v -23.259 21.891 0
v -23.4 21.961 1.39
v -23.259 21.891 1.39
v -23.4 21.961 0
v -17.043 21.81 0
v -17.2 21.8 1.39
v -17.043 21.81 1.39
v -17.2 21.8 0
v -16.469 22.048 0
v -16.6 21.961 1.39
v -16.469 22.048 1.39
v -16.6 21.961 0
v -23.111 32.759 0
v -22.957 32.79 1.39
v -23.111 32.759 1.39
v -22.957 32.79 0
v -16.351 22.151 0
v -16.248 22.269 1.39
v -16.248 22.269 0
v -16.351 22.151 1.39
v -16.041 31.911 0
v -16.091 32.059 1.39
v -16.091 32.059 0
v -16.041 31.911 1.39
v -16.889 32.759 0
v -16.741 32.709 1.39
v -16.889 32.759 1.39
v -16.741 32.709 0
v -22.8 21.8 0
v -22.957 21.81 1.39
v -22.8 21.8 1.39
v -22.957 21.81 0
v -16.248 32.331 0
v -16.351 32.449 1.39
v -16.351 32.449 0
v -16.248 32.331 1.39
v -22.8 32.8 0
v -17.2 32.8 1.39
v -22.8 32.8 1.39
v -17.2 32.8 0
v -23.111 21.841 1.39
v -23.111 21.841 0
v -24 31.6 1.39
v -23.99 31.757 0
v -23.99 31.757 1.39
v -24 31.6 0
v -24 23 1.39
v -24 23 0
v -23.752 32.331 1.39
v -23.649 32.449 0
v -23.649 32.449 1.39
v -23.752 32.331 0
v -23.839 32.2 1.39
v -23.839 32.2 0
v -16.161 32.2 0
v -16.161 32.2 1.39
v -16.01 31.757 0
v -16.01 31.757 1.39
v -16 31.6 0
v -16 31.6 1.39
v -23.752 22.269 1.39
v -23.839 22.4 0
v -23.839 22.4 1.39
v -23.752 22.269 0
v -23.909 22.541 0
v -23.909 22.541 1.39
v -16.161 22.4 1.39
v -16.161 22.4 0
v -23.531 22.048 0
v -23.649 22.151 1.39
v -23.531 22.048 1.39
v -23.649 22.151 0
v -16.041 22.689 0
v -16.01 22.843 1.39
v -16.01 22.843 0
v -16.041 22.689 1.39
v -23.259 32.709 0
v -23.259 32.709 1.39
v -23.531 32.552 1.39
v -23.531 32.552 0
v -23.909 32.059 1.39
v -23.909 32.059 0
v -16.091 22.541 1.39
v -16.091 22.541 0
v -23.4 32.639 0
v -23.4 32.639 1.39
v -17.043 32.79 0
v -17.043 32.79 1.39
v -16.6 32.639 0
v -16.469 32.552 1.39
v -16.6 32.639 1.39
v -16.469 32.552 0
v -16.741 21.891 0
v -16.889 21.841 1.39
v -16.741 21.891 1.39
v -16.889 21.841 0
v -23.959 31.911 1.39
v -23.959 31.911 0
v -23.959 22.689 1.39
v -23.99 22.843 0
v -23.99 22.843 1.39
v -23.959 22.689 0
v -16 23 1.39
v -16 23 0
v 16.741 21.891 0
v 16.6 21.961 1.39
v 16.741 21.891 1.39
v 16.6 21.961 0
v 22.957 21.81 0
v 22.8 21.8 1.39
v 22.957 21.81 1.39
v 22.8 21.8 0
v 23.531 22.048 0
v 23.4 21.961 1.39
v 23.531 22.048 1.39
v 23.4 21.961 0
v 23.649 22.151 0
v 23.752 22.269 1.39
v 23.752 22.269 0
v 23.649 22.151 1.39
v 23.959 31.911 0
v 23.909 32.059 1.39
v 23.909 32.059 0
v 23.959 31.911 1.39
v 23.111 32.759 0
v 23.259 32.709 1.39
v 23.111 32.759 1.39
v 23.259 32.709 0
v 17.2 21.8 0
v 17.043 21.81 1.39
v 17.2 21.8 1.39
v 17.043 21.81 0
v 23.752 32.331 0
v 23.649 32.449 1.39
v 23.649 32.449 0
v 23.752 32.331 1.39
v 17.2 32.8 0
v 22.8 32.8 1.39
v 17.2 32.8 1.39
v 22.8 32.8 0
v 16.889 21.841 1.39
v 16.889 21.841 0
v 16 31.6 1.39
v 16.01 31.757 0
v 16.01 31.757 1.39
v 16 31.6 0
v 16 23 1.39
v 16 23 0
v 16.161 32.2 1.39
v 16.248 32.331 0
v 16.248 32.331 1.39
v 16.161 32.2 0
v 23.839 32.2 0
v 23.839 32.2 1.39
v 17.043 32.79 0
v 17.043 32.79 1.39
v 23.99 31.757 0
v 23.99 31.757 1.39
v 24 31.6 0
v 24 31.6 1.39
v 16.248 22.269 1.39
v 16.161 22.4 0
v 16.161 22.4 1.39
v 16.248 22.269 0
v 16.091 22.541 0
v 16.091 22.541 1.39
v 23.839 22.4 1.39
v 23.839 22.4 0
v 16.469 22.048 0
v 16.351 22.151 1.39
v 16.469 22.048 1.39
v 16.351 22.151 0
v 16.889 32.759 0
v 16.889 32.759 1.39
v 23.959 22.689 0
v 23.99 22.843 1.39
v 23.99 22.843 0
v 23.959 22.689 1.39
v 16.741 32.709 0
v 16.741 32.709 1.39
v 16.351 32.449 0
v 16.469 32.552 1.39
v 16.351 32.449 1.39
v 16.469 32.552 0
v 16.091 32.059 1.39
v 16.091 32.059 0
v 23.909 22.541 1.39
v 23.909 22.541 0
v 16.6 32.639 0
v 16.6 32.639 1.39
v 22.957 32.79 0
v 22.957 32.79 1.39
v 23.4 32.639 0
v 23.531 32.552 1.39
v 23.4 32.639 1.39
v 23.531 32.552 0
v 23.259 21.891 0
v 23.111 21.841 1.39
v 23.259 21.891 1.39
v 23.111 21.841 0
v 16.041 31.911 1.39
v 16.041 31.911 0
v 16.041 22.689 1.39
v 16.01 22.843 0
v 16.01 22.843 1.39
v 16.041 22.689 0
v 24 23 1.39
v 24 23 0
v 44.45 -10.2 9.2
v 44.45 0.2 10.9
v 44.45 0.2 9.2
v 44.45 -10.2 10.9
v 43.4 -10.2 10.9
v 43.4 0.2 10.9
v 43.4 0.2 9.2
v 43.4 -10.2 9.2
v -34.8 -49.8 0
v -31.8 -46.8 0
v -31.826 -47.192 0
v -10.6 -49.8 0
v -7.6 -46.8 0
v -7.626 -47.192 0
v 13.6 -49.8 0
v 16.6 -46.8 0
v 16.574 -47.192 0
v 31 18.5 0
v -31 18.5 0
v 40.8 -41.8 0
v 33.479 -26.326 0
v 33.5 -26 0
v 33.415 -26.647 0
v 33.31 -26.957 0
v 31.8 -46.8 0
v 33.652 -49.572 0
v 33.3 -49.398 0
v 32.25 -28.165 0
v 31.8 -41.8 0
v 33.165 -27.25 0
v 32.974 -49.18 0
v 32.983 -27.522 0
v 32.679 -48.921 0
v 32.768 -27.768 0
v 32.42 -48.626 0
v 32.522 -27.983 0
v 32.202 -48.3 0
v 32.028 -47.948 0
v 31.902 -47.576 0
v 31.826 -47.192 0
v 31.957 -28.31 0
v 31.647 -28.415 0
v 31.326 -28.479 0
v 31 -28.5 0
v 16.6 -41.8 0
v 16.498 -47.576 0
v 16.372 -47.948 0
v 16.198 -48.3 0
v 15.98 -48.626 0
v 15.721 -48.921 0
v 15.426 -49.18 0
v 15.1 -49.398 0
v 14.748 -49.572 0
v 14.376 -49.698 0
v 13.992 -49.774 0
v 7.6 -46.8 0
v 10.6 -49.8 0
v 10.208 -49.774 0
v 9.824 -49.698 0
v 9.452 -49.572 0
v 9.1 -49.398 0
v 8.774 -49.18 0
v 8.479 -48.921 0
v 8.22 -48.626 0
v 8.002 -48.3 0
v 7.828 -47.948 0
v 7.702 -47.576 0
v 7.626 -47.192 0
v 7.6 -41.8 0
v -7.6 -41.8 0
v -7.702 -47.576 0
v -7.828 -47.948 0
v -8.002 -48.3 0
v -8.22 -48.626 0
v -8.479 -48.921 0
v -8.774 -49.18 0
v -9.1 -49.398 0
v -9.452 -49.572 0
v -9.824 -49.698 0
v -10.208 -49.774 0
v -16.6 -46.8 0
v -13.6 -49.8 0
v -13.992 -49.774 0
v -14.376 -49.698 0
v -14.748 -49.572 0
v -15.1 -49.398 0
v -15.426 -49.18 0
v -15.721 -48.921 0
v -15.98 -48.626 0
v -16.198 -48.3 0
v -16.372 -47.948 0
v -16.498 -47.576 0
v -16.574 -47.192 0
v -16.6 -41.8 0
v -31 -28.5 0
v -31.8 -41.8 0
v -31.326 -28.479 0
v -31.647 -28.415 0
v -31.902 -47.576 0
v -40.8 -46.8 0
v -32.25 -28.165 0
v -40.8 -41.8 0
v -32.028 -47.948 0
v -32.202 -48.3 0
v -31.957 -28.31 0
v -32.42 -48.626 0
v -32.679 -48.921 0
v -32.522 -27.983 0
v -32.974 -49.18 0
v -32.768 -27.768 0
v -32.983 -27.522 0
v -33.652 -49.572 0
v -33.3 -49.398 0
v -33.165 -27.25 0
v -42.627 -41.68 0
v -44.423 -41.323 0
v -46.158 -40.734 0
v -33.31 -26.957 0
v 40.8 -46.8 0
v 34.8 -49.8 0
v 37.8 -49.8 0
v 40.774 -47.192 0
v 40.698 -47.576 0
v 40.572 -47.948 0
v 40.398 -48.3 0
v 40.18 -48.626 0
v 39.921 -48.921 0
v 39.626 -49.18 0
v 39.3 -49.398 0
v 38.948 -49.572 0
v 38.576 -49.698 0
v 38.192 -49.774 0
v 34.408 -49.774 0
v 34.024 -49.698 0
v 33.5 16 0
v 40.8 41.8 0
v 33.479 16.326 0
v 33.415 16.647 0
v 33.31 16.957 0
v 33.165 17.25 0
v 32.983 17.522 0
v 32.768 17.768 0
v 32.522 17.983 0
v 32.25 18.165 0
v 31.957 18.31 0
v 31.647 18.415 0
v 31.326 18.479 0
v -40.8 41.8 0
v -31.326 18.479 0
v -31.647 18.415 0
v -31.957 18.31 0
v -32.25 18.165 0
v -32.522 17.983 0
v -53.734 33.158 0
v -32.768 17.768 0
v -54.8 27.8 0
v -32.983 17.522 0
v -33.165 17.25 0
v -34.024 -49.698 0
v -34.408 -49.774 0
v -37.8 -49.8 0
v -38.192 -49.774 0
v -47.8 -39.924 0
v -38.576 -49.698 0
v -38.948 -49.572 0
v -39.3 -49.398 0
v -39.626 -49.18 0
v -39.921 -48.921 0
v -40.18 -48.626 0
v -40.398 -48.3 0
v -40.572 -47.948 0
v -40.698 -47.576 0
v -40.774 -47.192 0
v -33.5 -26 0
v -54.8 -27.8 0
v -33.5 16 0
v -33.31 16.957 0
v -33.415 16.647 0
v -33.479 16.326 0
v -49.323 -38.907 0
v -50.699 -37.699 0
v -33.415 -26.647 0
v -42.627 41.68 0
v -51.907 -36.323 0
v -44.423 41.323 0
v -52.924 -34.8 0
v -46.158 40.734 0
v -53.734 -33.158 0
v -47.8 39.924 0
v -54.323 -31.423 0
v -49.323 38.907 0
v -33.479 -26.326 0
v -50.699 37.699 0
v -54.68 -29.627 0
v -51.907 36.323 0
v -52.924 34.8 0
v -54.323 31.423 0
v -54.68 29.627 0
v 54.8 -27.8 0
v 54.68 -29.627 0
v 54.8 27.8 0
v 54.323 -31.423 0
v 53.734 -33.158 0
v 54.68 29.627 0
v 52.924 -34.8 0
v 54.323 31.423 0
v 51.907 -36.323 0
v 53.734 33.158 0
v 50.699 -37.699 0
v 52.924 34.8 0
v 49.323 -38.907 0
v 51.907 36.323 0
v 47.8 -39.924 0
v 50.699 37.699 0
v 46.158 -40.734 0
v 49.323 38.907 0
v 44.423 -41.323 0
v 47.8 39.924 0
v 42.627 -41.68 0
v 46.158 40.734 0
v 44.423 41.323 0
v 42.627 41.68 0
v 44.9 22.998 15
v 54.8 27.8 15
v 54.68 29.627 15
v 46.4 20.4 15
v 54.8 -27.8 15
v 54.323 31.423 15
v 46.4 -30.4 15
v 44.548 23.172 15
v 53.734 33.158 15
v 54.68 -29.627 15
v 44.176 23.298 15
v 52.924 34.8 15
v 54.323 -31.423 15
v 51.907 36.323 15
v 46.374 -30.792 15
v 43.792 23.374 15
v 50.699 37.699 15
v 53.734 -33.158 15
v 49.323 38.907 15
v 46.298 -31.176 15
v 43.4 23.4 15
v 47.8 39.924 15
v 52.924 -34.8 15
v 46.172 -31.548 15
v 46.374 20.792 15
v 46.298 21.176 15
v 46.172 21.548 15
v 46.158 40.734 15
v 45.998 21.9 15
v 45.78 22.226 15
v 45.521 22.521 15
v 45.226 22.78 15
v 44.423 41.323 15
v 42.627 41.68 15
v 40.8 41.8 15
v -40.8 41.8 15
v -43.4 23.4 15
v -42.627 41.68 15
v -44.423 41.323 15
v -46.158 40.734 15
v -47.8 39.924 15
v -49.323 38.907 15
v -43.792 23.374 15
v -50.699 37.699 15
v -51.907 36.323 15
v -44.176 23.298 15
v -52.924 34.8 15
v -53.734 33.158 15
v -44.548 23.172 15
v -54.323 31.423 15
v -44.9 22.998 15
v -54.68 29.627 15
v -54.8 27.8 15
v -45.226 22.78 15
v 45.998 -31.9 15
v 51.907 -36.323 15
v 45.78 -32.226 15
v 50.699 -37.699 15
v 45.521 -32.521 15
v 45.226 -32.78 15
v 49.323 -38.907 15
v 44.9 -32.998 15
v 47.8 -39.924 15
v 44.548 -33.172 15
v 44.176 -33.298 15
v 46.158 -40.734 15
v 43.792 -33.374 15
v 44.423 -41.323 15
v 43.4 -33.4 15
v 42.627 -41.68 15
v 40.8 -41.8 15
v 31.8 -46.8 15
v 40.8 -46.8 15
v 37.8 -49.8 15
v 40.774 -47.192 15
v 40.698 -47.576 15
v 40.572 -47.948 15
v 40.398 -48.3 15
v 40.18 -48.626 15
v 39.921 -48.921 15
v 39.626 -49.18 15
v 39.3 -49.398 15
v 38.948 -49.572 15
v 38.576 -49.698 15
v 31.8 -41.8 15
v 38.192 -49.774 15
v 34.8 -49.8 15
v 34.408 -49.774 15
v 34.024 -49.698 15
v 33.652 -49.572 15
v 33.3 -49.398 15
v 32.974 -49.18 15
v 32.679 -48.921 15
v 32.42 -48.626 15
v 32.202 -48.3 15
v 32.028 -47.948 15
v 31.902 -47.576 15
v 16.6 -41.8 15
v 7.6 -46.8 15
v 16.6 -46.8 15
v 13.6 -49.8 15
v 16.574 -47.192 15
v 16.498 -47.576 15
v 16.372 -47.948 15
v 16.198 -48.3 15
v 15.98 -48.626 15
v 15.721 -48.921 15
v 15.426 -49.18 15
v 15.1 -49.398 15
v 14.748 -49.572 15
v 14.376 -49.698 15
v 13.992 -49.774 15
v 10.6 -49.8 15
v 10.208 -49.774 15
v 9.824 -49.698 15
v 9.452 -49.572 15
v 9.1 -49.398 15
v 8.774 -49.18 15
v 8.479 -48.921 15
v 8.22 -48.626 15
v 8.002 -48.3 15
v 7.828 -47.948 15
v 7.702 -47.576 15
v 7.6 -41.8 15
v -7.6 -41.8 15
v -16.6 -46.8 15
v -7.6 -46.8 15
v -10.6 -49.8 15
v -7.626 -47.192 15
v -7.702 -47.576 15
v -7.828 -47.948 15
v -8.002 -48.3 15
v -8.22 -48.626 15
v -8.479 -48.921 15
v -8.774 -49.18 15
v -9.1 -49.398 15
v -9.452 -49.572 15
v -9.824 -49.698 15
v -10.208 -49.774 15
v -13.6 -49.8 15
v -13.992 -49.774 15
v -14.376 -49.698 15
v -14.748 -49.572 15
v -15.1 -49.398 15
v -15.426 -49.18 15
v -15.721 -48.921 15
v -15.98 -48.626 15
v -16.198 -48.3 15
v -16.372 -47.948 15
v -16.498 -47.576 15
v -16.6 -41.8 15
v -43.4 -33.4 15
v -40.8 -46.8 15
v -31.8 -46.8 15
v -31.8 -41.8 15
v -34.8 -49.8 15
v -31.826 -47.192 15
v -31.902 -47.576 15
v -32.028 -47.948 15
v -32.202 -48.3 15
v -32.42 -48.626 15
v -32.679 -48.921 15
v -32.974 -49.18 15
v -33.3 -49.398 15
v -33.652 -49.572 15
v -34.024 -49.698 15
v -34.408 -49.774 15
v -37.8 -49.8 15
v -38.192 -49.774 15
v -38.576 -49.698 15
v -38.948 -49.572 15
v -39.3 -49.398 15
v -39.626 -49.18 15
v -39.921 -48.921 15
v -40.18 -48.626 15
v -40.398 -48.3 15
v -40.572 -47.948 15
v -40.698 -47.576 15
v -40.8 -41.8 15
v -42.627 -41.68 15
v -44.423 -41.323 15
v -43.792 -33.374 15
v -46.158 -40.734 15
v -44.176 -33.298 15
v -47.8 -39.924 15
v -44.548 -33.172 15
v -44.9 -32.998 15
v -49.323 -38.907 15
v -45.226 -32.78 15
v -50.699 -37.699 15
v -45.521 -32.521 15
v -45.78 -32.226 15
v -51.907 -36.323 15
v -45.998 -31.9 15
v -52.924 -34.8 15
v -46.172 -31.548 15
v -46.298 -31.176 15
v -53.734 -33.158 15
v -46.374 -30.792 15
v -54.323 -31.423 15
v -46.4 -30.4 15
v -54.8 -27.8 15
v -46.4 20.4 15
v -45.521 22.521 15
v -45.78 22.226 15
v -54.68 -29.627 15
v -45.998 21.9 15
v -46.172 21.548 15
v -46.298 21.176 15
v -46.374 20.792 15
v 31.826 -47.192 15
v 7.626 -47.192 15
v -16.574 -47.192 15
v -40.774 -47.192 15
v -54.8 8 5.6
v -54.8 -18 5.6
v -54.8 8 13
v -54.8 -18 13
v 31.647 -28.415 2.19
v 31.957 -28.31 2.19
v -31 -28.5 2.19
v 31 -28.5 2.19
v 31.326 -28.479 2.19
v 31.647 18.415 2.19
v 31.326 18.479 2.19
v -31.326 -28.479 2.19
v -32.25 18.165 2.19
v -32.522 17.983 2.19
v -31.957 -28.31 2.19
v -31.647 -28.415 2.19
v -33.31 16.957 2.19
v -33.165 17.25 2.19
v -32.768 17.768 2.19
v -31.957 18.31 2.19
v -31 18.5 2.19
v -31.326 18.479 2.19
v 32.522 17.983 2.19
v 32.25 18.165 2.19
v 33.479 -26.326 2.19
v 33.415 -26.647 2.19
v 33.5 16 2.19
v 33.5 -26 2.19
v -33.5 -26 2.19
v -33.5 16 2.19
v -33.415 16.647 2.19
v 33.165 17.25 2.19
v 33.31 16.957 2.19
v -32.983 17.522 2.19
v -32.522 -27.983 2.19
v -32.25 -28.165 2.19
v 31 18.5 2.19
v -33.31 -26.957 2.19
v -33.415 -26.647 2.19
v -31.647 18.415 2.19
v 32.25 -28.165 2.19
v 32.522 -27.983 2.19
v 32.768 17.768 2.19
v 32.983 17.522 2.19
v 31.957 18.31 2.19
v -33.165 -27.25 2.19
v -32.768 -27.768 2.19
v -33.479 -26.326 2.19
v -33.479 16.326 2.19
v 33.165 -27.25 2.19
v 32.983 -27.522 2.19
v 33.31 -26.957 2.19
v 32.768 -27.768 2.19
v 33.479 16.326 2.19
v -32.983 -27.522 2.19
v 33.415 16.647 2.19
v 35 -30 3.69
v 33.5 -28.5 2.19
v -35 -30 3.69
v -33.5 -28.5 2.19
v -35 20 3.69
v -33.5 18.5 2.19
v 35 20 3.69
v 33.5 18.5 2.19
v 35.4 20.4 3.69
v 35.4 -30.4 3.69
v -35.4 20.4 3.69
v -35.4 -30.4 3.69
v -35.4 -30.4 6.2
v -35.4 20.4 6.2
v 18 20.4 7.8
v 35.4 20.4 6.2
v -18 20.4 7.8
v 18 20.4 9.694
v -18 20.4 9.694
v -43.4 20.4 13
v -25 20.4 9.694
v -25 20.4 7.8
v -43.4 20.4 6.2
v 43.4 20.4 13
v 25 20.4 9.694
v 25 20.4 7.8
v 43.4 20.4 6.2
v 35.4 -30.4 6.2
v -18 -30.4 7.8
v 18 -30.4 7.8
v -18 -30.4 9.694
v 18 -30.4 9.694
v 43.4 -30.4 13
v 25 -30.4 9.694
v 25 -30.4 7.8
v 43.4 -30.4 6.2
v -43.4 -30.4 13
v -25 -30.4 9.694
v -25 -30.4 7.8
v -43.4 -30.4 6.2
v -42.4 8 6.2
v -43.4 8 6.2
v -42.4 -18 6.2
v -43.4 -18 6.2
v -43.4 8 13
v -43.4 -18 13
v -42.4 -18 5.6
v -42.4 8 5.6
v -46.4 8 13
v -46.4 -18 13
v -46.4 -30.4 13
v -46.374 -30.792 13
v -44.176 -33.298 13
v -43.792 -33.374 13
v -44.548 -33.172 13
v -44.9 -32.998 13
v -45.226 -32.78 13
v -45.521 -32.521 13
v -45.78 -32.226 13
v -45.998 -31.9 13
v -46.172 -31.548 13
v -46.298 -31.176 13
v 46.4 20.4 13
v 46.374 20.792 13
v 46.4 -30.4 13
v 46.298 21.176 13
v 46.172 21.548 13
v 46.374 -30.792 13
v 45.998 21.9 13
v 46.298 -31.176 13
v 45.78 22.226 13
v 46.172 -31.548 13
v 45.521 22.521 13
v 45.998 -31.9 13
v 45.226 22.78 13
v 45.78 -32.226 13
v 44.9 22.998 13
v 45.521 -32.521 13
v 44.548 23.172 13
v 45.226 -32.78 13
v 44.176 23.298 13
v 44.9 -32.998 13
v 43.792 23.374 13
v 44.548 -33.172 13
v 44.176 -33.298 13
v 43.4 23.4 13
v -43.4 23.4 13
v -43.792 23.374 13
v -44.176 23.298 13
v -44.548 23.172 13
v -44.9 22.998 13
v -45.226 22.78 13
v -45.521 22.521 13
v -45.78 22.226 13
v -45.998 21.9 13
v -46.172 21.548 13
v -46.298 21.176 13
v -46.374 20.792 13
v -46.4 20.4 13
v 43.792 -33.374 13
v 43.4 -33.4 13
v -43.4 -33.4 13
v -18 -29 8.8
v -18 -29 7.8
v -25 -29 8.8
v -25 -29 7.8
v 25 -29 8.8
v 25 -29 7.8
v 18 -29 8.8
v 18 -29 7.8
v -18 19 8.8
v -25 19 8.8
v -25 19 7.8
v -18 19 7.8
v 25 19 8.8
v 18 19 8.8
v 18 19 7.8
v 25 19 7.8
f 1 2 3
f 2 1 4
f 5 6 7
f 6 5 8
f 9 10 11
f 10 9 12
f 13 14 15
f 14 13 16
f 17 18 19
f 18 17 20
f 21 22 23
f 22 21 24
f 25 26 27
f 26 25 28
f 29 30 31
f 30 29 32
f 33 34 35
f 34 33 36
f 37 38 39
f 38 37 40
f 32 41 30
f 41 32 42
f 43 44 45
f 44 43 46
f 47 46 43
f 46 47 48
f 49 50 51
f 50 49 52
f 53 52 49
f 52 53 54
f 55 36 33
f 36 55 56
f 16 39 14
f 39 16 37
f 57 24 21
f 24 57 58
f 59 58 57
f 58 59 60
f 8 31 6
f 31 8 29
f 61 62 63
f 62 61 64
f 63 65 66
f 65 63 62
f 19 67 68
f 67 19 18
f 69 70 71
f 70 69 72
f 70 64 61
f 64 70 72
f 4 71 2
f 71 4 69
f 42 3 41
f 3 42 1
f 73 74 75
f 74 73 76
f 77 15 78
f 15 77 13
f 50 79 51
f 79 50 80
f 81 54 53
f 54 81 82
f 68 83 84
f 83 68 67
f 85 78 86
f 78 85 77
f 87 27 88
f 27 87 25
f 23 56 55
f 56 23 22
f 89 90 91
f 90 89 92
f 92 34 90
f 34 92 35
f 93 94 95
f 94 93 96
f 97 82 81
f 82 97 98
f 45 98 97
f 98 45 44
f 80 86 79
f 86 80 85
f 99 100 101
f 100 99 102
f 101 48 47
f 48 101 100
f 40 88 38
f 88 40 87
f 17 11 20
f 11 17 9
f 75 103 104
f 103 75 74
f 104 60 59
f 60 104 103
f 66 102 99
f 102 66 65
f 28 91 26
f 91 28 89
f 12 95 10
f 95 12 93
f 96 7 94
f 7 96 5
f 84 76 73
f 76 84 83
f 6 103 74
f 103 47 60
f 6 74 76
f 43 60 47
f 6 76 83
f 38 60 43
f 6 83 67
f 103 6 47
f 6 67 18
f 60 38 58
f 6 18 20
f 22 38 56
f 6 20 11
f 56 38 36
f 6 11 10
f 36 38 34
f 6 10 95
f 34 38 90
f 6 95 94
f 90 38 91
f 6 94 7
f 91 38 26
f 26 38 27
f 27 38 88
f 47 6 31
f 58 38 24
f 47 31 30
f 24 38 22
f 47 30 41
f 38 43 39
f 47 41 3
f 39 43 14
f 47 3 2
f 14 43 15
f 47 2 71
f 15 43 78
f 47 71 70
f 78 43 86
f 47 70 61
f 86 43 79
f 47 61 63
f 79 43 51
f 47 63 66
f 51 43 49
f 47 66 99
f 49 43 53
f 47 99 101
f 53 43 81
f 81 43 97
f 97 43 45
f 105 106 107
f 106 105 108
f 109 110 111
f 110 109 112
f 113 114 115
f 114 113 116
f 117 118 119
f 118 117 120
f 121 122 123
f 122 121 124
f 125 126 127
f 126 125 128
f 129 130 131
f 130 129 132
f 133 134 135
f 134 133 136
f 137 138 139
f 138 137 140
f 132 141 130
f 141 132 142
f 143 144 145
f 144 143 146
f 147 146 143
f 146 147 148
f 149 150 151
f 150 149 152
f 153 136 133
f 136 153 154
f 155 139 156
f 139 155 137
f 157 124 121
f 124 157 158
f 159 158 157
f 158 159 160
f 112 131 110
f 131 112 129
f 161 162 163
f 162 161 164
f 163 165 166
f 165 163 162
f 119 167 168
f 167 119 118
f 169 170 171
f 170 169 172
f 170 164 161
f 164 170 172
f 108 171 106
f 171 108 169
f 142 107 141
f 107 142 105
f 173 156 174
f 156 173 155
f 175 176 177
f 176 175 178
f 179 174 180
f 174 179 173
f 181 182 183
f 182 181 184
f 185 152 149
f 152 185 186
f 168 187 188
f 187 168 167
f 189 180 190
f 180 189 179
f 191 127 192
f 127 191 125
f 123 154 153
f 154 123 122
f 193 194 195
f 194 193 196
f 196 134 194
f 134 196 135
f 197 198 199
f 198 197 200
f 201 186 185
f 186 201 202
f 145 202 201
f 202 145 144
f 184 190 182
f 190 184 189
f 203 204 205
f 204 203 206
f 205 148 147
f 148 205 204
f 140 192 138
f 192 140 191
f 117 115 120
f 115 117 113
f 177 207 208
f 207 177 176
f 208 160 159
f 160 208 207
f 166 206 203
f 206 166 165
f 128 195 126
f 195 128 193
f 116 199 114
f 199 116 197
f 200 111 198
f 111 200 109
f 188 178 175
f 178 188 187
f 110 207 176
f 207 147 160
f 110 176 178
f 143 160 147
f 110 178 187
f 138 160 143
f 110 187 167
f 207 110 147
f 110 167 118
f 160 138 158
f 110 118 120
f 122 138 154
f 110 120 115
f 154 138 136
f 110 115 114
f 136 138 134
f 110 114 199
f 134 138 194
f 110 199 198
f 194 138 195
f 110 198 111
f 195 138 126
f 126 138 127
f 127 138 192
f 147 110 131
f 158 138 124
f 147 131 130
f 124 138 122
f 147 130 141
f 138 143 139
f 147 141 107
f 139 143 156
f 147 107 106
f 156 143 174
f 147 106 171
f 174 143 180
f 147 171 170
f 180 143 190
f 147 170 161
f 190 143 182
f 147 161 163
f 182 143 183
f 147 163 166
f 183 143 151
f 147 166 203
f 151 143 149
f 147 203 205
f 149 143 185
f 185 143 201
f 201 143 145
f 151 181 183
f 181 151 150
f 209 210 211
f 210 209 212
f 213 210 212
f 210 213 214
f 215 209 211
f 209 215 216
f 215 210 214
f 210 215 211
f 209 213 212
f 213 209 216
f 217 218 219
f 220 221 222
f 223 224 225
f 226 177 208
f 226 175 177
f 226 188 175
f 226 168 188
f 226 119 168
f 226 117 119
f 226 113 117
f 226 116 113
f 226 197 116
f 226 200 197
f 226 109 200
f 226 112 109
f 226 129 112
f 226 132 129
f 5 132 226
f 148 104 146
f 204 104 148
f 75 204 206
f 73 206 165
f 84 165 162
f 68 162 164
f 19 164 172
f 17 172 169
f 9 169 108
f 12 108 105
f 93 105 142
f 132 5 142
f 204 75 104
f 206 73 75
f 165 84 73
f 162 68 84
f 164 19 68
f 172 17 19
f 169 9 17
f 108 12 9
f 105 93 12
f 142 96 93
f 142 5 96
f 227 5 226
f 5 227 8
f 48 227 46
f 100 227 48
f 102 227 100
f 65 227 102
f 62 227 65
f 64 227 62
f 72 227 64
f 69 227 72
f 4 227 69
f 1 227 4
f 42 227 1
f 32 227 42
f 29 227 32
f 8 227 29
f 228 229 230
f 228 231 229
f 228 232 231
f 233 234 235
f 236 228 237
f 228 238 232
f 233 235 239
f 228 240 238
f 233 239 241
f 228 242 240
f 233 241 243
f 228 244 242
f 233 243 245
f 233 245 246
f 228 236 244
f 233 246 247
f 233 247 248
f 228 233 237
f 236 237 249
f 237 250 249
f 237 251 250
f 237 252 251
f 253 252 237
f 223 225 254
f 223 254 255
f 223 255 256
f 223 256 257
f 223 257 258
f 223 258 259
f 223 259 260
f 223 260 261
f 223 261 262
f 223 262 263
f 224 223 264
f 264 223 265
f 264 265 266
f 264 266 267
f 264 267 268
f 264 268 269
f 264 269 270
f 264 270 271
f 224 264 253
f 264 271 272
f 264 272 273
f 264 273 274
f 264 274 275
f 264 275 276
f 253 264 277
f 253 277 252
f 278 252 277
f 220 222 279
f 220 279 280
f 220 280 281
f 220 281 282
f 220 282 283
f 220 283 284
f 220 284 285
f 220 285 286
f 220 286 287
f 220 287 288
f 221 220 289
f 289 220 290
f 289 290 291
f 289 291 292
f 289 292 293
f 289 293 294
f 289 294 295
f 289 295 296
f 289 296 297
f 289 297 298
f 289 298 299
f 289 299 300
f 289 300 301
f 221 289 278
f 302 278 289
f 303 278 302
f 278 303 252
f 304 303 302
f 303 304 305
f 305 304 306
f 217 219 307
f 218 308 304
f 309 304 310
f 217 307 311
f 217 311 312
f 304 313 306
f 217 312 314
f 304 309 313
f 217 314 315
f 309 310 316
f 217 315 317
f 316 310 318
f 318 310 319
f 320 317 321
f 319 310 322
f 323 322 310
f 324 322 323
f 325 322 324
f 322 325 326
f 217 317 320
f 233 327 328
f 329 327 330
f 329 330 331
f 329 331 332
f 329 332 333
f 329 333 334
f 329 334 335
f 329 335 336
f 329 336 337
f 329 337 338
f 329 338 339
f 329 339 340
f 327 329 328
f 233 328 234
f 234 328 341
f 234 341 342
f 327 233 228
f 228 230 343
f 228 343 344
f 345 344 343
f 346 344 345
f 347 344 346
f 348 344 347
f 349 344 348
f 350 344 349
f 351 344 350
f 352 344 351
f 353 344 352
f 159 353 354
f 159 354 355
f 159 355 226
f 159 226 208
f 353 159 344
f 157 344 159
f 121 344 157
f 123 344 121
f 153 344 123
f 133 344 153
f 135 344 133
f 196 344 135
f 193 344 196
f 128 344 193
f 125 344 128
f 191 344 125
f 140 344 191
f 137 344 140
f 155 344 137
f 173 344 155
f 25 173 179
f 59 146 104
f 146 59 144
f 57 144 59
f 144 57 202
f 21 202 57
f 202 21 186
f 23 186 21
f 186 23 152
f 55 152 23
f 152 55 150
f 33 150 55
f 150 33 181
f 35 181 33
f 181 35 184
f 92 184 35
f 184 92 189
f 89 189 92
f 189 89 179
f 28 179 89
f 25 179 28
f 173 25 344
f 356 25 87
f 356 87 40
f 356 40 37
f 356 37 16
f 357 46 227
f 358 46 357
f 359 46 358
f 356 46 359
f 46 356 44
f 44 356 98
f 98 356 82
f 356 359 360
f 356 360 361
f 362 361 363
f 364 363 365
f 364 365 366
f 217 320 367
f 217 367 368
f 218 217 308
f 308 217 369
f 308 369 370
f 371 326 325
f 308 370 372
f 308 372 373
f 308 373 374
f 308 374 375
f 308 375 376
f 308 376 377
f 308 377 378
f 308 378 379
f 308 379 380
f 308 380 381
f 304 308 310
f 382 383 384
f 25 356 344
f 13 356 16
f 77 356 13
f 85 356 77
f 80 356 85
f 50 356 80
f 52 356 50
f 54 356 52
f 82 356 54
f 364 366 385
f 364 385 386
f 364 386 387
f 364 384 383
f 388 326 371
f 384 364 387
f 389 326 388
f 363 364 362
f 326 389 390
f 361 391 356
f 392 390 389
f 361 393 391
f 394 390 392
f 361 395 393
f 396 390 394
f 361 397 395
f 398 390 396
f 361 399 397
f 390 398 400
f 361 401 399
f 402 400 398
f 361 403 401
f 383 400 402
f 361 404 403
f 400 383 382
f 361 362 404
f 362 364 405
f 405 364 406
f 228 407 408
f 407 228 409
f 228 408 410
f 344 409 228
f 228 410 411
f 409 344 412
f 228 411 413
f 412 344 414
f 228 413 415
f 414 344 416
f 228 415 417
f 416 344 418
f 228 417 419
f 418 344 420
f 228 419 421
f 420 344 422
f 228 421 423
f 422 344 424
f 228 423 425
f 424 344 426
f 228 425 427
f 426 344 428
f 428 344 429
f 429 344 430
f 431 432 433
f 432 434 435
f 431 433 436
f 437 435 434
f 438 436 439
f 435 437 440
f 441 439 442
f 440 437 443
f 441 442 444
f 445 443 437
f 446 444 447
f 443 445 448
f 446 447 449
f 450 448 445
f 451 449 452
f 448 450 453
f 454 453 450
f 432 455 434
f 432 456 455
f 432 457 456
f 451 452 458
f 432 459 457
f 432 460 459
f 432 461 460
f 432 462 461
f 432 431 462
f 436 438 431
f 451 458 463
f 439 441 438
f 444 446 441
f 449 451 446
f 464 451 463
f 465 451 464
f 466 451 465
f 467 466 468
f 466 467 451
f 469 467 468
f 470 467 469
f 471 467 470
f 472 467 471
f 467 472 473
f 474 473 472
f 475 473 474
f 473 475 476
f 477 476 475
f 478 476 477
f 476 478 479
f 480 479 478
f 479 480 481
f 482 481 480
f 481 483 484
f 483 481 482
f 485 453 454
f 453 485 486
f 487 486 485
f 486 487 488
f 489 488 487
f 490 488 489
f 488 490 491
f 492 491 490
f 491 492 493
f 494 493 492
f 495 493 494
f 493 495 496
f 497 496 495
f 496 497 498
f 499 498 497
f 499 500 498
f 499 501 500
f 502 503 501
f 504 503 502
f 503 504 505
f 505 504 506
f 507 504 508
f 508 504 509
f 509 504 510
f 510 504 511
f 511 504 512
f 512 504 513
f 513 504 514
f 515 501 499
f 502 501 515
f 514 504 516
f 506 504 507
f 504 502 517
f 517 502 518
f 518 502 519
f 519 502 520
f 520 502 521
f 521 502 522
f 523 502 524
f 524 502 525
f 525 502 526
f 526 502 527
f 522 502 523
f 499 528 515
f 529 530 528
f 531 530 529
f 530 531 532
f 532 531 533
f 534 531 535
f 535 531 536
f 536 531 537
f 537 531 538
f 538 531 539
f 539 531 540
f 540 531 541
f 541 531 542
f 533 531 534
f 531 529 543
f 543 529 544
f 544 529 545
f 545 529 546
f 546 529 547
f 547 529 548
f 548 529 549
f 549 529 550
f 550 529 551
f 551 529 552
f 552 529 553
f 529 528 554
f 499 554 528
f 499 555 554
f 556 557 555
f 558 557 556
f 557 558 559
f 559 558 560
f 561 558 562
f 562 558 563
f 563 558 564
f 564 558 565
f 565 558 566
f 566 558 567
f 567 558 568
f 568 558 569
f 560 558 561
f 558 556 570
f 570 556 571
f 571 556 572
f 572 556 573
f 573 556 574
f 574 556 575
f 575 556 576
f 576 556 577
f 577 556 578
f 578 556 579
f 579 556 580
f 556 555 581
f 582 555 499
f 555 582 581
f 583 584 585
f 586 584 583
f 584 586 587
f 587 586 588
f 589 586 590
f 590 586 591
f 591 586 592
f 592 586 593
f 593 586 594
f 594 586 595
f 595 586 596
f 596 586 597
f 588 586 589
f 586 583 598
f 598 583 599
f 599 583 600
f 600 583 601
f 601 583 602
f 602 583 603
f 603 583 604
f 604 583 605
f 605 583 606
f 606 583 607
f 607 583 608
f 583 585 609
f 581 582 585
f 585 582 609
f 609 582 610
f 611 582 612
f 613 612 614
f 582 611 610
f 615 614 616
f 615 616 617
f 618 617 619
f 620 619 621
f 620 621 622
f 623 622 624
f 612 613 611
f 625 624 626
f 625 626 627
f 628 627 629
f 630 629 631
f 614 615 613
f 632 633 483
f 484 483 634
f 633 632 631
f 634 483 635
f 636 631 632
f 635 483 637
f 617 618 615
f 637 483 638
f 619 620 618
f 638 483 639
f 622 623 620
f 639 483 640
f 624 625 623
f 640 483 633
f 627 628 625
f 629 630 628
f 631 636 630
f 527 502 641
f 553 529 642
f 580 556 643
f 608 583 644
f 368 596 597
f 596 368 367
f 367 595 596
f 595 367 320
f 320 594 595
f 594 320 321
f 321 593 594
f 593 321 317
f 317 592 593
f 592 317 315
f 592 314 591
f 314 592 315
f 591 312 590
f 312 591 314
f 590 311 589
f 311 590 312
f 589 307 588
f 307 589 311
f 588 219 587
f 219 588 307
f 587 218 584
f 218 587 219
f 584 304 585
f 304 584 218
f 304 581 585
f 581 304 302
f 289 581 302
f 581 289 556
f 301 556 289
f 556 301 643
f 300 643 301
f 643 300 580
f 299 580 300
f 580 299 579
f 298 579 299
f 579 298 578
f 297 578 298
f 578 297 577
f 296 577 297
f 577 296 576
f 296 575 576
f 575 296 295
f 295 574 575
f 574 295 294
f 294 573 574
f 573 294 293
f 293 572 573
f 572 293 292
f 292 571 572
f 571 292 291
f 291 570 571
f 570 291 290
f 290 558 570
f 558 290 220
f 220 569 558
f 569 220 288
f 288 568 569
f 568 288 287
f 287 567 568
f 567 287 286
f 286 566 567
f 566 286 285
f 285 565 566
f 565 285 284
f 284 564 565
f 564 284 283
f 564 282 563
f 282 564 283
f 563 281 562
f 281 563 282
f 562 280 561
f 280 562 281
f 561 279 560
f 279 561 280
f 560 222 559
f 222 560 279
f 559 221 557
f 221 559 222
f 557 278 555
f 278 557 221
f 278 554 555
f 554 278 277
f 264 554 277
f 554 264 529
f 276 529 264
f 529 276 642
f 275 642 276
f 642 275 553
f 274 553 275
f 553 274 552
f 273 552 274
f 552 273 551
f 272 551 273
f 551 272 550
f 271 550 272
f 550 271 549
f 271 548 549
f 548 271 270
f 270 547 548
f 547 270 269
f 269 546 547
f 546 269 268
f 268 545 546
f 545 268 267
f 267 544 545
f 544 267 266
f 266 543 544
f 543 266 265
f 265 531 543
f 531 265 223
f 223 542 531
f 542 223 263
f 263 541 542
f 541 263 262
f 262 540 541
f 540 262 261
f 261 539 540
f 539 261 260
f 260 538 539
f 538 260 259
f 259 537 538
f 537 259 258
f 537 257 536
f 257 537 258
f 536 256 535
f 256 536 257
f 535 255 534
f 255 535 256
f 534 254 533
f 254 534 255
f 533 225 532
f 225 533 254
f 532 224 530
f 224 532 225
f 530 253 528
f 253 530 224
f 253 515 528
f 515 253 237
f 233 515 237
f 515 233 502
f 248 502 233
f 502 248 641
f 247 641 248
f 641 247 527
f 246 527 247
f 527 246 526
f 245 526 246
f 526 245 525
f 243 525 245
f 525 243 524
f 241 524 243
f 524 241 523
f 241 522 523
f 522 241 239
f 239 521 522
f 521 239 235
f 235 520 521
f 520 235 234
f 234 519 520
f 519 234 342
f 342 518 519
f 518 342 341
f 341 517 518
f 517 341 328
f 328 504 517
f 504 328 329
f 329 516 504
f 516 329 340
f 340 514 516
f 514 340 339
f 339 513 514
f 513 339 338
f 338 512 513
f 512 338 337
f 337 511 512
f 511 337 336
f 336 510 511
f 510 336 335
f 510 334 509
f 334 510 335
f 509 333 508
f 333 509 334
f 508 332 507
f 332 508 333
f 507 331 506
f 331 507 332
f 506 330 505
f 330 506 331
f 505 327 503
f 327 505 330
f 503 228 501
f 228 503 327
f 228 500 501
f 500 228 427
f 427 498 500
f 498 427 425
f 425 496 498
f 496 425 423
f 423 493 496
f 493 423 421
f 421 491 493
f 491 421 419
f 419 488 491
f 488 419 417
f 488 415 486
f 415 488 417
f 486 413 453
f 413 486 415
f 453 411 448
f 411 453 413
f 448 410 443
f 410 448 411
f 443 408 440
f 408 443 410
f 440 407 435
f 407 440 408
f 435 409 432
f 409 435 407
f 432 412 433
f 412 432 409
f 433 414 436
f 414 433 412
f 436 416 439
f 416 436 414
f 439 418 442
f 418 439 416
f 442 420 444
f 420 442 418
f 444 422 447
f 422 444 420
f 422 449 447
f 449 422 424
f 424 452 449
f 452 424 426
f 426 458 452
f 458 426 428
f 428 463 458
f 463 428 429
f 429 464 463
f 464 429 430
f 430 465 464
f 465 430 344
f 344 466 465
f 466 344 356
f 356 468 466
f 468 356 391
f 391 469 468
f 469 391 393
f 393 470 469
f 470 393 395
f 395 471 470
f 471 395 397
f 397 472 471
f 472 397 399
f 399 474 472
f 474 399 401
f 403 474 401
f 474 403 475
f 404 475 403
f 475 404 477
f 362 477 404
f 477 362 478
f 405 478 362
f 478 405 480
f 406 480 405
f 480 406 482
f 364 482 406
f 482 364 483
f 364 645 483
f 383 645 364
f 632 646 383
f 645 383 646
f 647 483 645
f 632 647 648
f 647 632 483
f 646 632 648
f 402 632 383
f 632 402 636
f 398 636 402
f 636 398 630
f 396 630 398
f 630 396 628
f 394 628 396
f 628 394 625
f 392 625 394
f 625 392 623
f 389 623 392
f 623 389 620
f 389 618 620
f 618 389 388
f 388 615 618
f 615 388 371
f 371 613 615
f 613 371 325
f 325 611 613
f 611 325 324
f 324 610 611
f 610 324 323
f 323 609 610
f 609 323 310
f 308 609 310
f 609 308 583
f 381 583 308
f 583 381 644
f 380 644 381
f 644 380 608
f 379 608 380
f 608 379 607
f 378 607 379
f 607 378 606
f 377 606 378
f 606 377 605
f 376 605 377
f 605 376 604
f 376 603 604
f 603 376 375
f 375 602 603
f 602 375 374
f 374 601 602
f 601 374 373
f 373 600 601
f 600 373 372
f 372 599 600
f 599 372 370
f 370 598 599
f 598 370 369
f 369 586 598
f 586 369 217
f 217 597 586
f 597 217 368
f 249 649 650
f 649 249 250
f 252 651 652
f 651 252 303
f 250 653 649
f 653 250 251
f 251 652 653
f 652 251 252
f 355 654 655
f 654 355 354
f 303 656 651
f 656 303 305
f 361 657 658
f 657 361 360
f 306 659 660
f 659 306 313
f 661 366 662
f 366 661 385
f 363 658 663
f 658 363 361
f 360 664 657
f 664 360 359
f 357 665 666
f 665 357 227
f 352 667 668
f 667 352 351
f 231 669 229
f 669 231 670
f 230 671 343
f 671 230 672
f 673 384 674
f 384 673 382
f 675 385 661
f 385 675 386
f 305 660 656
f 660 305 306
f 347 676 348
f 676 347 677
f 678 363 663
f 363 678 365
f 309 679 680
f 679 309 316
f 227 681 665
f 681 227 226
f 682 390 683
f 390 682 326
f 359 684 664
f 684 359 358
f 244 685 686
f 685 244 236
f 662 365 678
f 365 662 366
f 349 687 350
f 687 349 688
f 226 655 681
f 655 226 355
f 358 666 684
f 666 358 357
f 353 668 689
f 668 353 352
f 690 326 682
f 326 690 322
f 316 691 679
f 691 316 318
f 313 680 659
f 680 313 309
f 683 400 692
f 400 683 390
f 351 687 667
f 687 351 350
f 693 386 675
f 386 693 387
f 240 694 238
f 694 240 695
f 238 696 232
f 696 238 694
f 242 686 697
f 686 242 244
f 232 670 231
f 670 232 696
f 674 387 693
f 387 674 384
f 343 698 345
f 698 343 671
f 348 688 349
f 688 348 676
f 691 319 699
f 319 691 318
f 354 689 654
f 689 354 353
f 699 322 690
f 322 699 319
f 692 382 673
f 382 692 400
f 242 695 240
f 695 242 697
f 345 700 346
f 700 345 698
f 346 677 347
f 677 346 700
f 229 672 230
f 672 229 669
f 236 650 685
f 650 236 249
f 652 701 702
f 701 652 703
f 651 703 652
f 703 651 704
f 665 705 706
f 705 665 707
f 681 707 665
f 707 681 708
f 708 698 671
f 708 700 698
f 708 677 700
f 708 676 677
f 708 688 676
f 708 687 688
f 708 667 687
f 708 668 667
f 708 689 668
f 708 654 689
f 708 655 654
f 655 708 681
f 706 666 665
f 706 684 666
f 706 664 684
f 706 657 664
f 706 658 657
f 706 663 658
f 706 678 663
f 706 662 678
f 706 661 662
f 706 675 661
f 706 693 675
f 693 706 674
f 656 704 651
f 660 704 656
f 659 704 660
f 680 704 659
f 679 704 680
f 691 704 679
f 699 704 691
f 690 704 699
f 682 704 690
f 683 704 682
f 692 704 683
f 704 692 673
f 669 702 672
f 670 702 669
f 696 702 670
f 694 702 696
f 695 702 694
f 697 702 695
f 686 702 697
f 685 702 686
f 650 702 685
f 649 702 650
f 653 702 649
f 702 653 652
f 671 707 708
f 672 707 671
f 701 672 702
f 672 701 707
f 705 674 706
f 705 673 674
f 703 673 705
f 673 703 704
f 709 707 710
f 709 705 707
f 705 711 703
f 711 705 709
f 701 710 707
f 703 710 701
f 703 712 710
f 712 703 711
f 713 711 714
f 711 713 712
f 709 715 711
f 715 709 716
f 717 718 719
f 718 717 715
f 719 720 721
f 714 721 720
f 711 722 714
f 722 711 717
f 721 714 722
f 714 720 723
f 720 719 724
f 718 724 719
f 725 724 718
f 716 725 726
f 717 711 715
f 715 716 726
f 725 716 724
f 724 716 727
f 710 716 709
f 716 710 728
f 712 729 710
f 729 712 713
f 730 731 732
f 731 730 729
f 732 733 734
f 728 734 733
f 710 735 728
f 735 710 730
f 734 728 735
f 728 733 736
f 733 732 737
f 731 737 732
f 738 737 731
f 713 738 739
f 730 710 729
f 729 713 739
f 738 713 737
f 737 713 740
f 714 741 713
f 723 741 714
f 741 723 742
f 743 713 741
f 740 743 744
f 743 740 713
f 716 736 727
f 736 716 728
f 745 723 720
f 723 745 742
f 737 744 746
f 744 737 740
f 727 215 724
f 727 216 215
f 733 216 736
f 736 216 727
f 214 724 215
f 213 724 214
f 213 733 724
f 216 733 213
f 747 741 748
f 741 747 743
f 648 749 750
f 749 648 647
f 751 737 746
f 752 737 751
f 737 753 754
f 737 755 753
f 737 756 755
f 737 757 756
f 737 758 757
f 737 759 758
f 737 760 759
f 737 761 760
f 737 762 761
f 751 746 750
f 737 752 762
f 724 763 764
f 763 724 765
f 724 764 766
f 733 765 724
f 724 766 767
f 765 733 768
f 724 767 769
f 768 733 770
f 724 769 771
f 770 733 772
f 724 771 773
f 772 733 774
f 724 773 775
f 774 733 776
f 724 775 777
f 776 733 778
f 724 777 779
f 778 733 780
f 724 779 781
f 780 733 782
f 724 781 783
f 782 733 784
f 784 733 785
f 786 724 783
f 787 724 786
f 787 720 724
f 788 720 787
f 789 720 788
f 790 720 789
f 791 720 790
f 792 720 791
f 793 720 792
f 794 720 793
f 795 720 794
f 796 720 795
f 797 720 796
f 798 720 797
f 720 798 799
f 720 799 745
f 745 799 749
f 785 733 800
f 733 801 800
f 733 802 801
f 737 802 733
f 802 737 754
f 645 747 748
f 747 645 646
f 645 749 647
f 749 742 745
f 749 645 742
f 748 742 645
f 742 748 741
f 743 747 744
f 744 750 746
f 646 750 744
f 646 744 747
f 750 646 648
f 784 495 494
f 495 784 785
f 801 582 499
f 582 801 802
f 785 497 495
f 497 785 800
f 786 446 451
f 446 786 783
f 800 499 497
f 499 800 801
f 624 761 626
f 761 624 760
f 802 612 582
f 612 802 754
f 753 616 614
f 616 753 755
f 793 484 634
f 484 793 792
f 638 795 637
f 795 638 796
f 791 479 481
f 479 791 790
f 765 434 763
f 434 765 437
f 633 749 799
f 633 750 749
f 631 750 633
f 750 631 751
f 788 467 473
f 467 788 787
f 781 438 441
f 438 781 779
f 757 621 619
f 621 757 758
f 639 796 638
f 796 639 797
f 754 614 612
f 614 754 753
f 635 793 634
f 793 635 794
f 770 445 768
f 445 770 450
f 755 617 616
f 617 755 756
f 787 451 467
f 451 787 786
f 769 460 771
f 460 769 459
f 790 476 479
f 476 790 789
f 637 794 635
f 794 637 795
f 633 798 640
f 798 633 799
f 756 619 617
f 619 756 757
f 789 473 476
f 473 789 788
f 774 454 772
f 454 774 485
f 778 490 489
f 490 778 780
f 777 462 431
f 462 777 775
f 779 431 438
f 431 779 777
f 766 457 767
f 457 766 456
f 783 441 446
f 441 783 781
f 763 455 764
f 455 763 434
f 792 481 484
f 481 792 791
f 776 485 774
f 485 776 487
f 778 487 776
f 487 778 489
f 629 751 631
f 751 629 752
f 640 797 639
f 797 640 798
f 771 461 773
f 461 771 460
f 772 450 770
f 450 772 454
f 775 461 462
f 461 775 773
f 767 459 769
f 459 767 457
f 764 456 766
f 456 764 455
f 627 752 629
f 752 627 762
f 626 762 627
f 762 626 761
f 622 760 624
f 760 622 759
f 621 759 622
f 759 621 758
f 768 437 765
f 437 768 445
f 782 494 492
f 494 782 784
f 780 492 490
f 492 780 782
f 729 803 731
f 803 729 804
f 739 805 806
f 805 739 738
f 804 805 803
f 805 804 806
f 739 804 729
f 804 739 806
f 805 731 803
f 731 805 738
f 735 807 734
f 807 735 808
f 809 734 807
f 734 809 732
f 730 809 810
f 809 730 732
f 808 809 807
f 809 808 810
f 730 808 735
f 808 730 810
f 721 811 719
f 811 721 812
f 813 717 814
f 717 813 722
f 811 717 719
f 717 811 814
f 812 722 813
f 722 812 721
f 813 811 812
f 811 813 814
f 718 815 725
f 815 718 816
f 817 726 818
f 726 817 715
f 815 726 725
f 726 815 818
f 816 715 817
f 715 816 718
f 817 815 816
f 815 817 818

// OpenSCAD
// =====================================================================
// Clawd CYD — carcaça para a CYD ESP32-2432S028 no formato do Clawd
// =====================================================================
//
// Duas peças, encaixe por pressão, SEM parafuso:
//
//   corpo  — o bichinho. A cara já vem com a janela da tela. A placa entra
//            por TRÁS, tela virada para a janela.
//   tampa  — fecha as costas, prende a placa e leva o canal do cabo.
//
// Por que a cara é inteiriça e a abertura fica atrás: assim não há emenda
// nenhuma na frente, que é o lado que se olha.
//
// ---------------------------------------------------------------------
// DE ONDE VÊM AS MEDIDAS — leia antes de imprimir a peça inteira
// ---------------------------------------------------------------------
// As medidas da placa são as PUBLICADAS para a ESP32-2432S028, não medidas
// nesta unidade com paquímetro:
//
//   PCB                86 x 50 x 1,6 mm
//   módulo da tela     70 x 50 mm, sobressaindo 4 mm da face do PCB
//   área visível       59,5 x 45 mm
//   componentes atrás  até 4,8 mm (botões e conector do alto-falante)
//
// Duas coisas eu NÃO encontrei publicadas e portanto NÃO uso:
//   - a posição dos furos de fixação  -> a placa é presa por abas elásticas
//     nas bordas, e o modelo não tem furo nenhum;
//   - a posição exata do conector USB -> a abertura ocupa quase toda a
//     lateral esquerda, então acerta o conector onde quer que ele esteja.
//
// A posição da área visível dentro do módulo também não é publicada. Em vez
// de supor, a janela expõe o módulo quase inteiro (67 x 47) e o rebaixo
// segura a borda dele. Assim a área visível cai dentro da janela em qualquer
// posição plausível.
//
// >>> IMPRIMA A PEÇA "teste" ANTES. São ~10 minutos e 3 g de filamento, e
// >>> ela verifica o encaixe do PCB e a abertura do USB sem comprometer
// >>> 6 horas de impressão da carcaça.
//
// ---------------------------------------------------------------------
// COMO GERAR OS STL
// ---------------------------------------------------------------------
//   openscad -o corpo.stl -D "part=\"corpo\"" clawd_cyd.scad
//   openscad -o tampa.stl -D "part=\"tampa\"" clawd_cyd.scad
//   openscad -o teste.stl -D "part=\"teste\"" clawd_cyd.scad
//
// (ou rode ./build.sh nesta pasta)
//
// ---------------------------------------------------------------------
// COMO IMPRIMIR
// ---------------------------------------------------------------------
// As duas peças foram desenhadas para imprimir DEITADAS, sem suporte nenhum:
// todo vão para cima é chanfrado a 45°, que é auto-sustentável.
//
//   corpo  cara para BAIXO na mesa (a cavidade abre para cima)
//   tampa  face lisa para BAIXO
//
//   bico 0,4 mm · camada 0,2 mm · 3 perímetros · 15% de preenchimento
//   PLA ou PETG · SEM suporte · SEM balsa
//
// PETG deixa as abas mais tolerantes; PLA imprime melhor os detalhes da cara.

// =====================================================================
// Parâmetros
// =====================================================================
part = "corpo";          // "corpo" | "tampa" | "teste" | "montado"

/* [Placa] */
pcb_w      = 86.0;       // comprimento do PCB
pcb_h      = 50.0;       // largura do PCB
pcb_t      = 1.6;        // espessura do PCB
disp_w     = 70.0;       // módulo da tela
disp_h     = 50.0;
disp_z     = 4.0;        // quanto o módulo sobressai da face do PCB
back_comp  = 5.2;        // altura livre para os componentes de trás (4,8 + folga)

/* [Folgas] */
fit        = 0.4;        // folga por lado do PCB. Aumente para 0,6 se ficar apertado
wall       = 2.4;        // parede externa
face       = 2.2;        // espessura da cara (frente)
lid_t      = 2.0;        // espessura da tampa

/* [Silhueta do Clawd] */
side_pad   = 9.0;        // borda dos lados
top_pad    = 19.0;       // borda de cima — é onde moram os olhos. Precisa ser
                         // generosa: com 14 mm os olhos viravam dois pontinhos
                         // espremidos e a peça lia como televisão, não bicho
bot_pad    = 9.0;        // borda de baixo
corner_r   = 14.0;       // cantos bem redondos, como no pixel art
leg_n      = 4;          // perninhas
leg_w      = 9.0;
leg_h      = 8.0;
leg_r      = 3.0;

/* [Cara] */
eye_w      = 8.0;        // olhos: retângulos verticais, como no pixel art
eye_h      = 11.0;
eye_gap    = 40.0;       // distância entre os centros
eye_deep   = 1.4;        // profundidade do rebaixo

/* [Encaixes] */
tab_n      = 4;          // abas que prendem o PCB pela frente
tab_w      = 7.0;
tab_grip   = 1.4;        // avanço da aba a partir da parede. Como a folga fit
                         // deixa o PCB a 0,4 mm dela, a pega real é 1,0 mm -
                         // suficiente, e mantém o vão de baixo imprimível
clip_w     = 10.0;       // clipes da tampa
clip_deep  = 0.9;        // profundidade do ressalto
clip_post  = 2.2;        // altura da haste do clipe
clip_barb  = 1.5;        // altura do ressalto
lid_gap    = 0.35;       // folga da tampa dentro do rebaixo
lid_flange = 3.0;        // quanto a tampa avança além da cavidade

/* [Cabo] */
usb_open_w = 26.0;       // abertura do USB na lateral esquerda
cable_w    = 9.0;        // canal do cabo, saindo por trás
cable_h    = 6.0;

$fn = 48;

// =====================================================================
// Derivadas
// =====================================================================
cav_w  = pcb_w + 2 * fit;                 // cavidade do PCB
cav_h  = pcb_h + 2 * fit;
body_w = pcb_w + 2 * (fit + wall + side_pad);
body_h = pcb_h + 2 * fit + wall * 2 + top_pad + bot_pad;

// deslocamento vertical: a borda de cima é maior que a de baixo, então o
// centro do PCB não é o centro do corpo
pcb_dy = (bot_pad - top_pad) / 2;

// profundidade interna: componentes de trás + PCB + módulo da tela
depth_in = back_comp + pcb_t + disp_z;
body_z   = face + depth_in + lid_t;

win_w = disp_w - 3.0;                     // janela: expõe o módulo menos o rebaixo
win_h = disp_h - 3.0;

// Faixa em Z da abertura do USB: começa um pouco antes da face frontal do PCB
// e vai até a tampa. O conector fica do lado dos componentes, não do lado da
// tela, então centrar a abertura no PCB deixaria metade dela inútil.
usb_z0 = face + disp_z - 0.6;
usb_z1 = body_z - lid_t;

// =====================================================================
// Primitivas
// =====================================================================

// retângulo 2D de cantos arredondados
module rrect(w, h, r) {
    offset(r = r) offset(r = -r) square([w, h], center = true);
}

// silhueta do bichinho: corpo arredondado + perninhas embaixo
module clawd_2d() {
    union() {
        translate([0, 0]) rrect(body_w, body_h, corner_r);
        // perninhas, distribuídas na largura útil do corpo
        span = body_w - 2 * corner_r - leg_w;
        for (i = [0 : leg_n - 1]) {
            x = -span / 2 + span * i / (leg_n - 1);
            translate([x, -body_h / 2 - leg_h / 2 + leg_r])
                rrect(leg_w, leg_h + leg_r * 2, leg_r);
        }
    }
}

// prisma com o topo chanfrado a 45°, para vãos ficarem auto-sustentáveis
module chamfered_slot(w, h, z, cham) {
    hull() {
        translate([0, 0, 0])        linear_extrude(0.01) square([w, h], center = true);
        translate([0, 0, cham])     linear_extrude(0.01)
            square([w + 2 * cham, h + 2 * cham], center = true);
        translate([0, 0, z - 0.01]) linear_extrude(0.01)
            square([w + 2 * cham, h + 2 * cham], center = true);
    }
}

// =====================================================================
// CORPO — a cara com a janela, e a cavidade abrindo para trás
// =====================================================================
// Z = 0 é a face da frente (a que encosta na mesa da impressora).
// Z cresce para trás.
module corpo() {
    difference() {
        // ---- volume cheio ----
        linear_extrude(body_z) clawd_2d();

        // ---- janela da tela, com rebaixo que segura o módulo ----
        // A janela é menor que o módulo; o degrau entre as duas é chanfrado a
        // 45° para imprimir sem ponte.
        translate([0, pcb_dy, -0.1])
            linear_extrude(face + 0.2) rrect(win_w, win_h, 2.5);
        translate([0, pcb_dy, face - 0.01])
            chamfered_slot(win_w, win_h, 1.6, 1.5);

        // ---- alojamento do módulo da tela ----
        translate([0, pcb_dy, face + 1.5 - 0.01])
            linear_extrude(disp_z + 0.6)
                square([disp_w + 2 * fit, disp_h + 2 * fit], center = true);

        // ---- cavidade do PCB e dos componentes de trás ----
        translate([0, pcb_dy, face + disp_z])
            linear_extrude(body_z) square([cav_w, cav_h], center = true);

        // ---- abertura do USB, na lateral esquerda ----
        // Larga de propósito: a posição exata do conector ao longo da borda não
        // é publicada, então a abertura cobre 26 mm e acerta onde quer que ele
        // esteja. Em Z ela vai da face frontal do PCB até a tampa, porque o
        // conector é soldado no PCB e cresce para o lado dos componentes.
        translate([-(cav_w / 2 + (wall + side_pad) / 2 + 1),
                   pcb_dy,
                   (usb_z0 + usb_z1) / 2])
            cube([wall + side_pad + 4, usb_open_w, usb_z1 - usb_z0], center = true);

        // ---- olhos, rebaixados na borda de cima ----
        for (sx = [-1, 1])
            translate([sx * eye_gap / 2, body_h / 2 - top_pad / 2 + pcb_dy, -0.01])
                linear_extrude(eye_deep) rrect(eye_w, eye_h, 1.2);

        // ---- rebaixo em que a tampa afunda, para ficar rente às costas ----
        translate([0, pcb_dy, body_z - lid_t])
            linear_extrude(lid_t + 0.1)
                rrect(cav_w + 2 * lid_flange, cav_h + 2 * lid_flange, 3);

        // ---- entalhes onde os clipes da tampa travam ----
        for (sx = [-1, 1])
            translate([sx * (cav_w / 2 + clip_deep / 2), pcb_dy,
                       body_z - lid_t - clip_post - clip_barb / 2])
                cube([clip_deep + 0.3, clip_w + 0.4, clip_barb + 0.2], center = true);
    }

    // ---- abas que prendem o PCB pela frente ----
    // Ficam nas bordas de cima e de baixo, onde o módulo termina; avançam
    // tab_grip sobre a face do PCB e são chanfradas para a placa entrar
    // empurrando.
    for (sy = [-1, 1])
        for (i = [-1, 1])
            translate([i * (pcb_w / 4), sy * (cav_h / 2) + pcb_dy, face + disp_z + pcb_t])
                aba(sy);
}

// Aba de retenção do PCB.
//
// Duas exigências que brigam entre si, e como elas se resolvem:
//
//   A placa entra POR TRÁS (de Z maior para Z menor) e precisa achar uma rampa
//   nesse caminho, senão bate no ponto mais saliente e não passa. Logo o lado
//   de CIMA da aba tem de ser inclinado.
//
//   Mas a peça imprime de Z=0 para cima, e a aba fica a 7,8 mm de altura, no
//   meio da impressão. Se ela nascesse afastada da parede — que é o que uma
//   rampa simples de baixo para cima faria — o bico depositaria material no ar.
//
// A forma que atende as duas: um ressalto ancorado na parede desde a primeira
// camada, com a face de baixo plana (é ela que trava a placa) e chanfro de 45°
// só no topo (é ele a rampa de entrada). O vão de baixo são 1,4 mm saindo da
// parede — dentro do que qualquer impressora faz em balanço.
module aba(sy) {
    hull() {
        // corpo do ressalto: face de baixo plana, encostada na parede
        translate([0, sy * (1.0 - tab_grip / 2), 0.5])
            cube([tab_w, tab_grip + 2.0, 1.0], center = true);
        // topo recuando para a parede: a rampa de entrada, a 45°
        translate([0, sy * 1.4, 1.0 + tab_grip])
            cube([tab_w, 1.2, 0.01], center = true);
    }
}

// =====================================================================
// TAMPA — fecha as costas e leva o canal do cabo
// =====================================================================
// A tampa NÃO repete a silhueta inteira do bichinho: ela tem o tamanho do
// rebaixo aberto nas costas do corpo, e afunda nele até ficar rente. Uma tampa
// com a silhueta toda ficaria pousada por cima, somando 2 mm à espessura e
// deixando as perninhas duplicadas em duas peças que precisariam alinhar.
//
// Impressão: face lisa para baixo. Os clipes crescem para cima e têm chanfro
// de 45° nas duas pontas, então entram empurrando e travam no entalhe.
module tampa() {
    lw = cav_w + 2 * lid_flange - lid_gap;
    lh = cav_h + 2 * lid_flange - lid_gap;
    difference() {
        union() {
            linear_extrude(lid_t) rrect(lw, lh, 3);
            // saia que entra na cavidade e encosta na traseira do PCB
            translate([0, 0, lid_t - 0.01])
                linear_extrude(1.2)
                    square([cav_w - 0.6, cav_h - 0.6], center = true);
        }
        // canal do cabo, saindo por trás em vez de pela lateral: assim o cabo
        // dobra atrás do bichinho e não fica aparecendo do lado
        translate([-lw / 2 + 8, 0, -0.1])
            linear_extrude(lid_t + 2) rrect(cable_w, cable_h, 2);
    }

    for (sx = [-1, 1])
        translate([sx * (cav_w / 2 - 0.8), 0, lid_t]) clipe(sx);
}

module clipe(sx) {
    union() {
        translate([0, 0, clip_post / 2])
            cube([1.6, clip_w, clip_post], center = true);
        // Ressalto em losango: a face de baixo é a rampa de entrada e a de
        // cima é a que trava. Ambas a 45°, então imprime sem suporte de pé.
        translate([sx * (0.8 + clip_deep / 2), 0, clip_post + clip_barb / 2])
            hull() {
                translate([0, 0, -clip_barb / 2])
                    cube([0.01, clip_w, 0.01], center = true);
                cube([clip_deep, clip_w, 0.01], center = true);
                translate([0, 0, clip_barb / 2])
                    cube([0.01, clip_w, 0.01], center = true);
            }
    }
}

// =====================================================================
// TESTE DE ENCAIXE — só o essencial, para conferir antes da peça inteira
// =====================================================================
// Um anel de 10 mm que reproduz a cavidade do PCB, uma aba de cada lado e a
// abertura do USB. Se a placa entra e trava aqui, entra na carcaça.
module teste() {
    h = 10;
    difference() {
        linear_extrude(h) rrect(cav_w + 2 * wall, cav_h + 2 * wall, 3);
        translate([0, 0, -0.1]) linear_extrude(h + 0.2)
            square([cav_w, cav_h], center = true);
        translate([-cav_w / 2 - wall - 1, 0, 2])
            rotate([0, 90, 0]) linear_extrude(wall + 2)
                rrect(pcb_t + back_comp - 1.2, usb_open_w, 1.5);
    }
    for (sy = [-1, 1])
        translate([0, sy * (cav_h / 2), 2 + pcb_t]) aba(sy);
    // degrau em que o PCB apoia
    for (sy = [-1, 1])
        translate([0, sy * (cav_h / 2 + 0.6), 1])
            cube([cav_w - 20, 1.2, 2], center = true);
}

// =====================================================================
// Seleção da peça
// =====================================================================
if (part == "corpo")      corpo();
else if (part == "tampa") tampa();
else if (part == "teste") teste();
else if (part == "montado") {
    corpo();
    translate([0, 0, body_z + 12]) rotate([180, 0, 0]) tampa();
}
